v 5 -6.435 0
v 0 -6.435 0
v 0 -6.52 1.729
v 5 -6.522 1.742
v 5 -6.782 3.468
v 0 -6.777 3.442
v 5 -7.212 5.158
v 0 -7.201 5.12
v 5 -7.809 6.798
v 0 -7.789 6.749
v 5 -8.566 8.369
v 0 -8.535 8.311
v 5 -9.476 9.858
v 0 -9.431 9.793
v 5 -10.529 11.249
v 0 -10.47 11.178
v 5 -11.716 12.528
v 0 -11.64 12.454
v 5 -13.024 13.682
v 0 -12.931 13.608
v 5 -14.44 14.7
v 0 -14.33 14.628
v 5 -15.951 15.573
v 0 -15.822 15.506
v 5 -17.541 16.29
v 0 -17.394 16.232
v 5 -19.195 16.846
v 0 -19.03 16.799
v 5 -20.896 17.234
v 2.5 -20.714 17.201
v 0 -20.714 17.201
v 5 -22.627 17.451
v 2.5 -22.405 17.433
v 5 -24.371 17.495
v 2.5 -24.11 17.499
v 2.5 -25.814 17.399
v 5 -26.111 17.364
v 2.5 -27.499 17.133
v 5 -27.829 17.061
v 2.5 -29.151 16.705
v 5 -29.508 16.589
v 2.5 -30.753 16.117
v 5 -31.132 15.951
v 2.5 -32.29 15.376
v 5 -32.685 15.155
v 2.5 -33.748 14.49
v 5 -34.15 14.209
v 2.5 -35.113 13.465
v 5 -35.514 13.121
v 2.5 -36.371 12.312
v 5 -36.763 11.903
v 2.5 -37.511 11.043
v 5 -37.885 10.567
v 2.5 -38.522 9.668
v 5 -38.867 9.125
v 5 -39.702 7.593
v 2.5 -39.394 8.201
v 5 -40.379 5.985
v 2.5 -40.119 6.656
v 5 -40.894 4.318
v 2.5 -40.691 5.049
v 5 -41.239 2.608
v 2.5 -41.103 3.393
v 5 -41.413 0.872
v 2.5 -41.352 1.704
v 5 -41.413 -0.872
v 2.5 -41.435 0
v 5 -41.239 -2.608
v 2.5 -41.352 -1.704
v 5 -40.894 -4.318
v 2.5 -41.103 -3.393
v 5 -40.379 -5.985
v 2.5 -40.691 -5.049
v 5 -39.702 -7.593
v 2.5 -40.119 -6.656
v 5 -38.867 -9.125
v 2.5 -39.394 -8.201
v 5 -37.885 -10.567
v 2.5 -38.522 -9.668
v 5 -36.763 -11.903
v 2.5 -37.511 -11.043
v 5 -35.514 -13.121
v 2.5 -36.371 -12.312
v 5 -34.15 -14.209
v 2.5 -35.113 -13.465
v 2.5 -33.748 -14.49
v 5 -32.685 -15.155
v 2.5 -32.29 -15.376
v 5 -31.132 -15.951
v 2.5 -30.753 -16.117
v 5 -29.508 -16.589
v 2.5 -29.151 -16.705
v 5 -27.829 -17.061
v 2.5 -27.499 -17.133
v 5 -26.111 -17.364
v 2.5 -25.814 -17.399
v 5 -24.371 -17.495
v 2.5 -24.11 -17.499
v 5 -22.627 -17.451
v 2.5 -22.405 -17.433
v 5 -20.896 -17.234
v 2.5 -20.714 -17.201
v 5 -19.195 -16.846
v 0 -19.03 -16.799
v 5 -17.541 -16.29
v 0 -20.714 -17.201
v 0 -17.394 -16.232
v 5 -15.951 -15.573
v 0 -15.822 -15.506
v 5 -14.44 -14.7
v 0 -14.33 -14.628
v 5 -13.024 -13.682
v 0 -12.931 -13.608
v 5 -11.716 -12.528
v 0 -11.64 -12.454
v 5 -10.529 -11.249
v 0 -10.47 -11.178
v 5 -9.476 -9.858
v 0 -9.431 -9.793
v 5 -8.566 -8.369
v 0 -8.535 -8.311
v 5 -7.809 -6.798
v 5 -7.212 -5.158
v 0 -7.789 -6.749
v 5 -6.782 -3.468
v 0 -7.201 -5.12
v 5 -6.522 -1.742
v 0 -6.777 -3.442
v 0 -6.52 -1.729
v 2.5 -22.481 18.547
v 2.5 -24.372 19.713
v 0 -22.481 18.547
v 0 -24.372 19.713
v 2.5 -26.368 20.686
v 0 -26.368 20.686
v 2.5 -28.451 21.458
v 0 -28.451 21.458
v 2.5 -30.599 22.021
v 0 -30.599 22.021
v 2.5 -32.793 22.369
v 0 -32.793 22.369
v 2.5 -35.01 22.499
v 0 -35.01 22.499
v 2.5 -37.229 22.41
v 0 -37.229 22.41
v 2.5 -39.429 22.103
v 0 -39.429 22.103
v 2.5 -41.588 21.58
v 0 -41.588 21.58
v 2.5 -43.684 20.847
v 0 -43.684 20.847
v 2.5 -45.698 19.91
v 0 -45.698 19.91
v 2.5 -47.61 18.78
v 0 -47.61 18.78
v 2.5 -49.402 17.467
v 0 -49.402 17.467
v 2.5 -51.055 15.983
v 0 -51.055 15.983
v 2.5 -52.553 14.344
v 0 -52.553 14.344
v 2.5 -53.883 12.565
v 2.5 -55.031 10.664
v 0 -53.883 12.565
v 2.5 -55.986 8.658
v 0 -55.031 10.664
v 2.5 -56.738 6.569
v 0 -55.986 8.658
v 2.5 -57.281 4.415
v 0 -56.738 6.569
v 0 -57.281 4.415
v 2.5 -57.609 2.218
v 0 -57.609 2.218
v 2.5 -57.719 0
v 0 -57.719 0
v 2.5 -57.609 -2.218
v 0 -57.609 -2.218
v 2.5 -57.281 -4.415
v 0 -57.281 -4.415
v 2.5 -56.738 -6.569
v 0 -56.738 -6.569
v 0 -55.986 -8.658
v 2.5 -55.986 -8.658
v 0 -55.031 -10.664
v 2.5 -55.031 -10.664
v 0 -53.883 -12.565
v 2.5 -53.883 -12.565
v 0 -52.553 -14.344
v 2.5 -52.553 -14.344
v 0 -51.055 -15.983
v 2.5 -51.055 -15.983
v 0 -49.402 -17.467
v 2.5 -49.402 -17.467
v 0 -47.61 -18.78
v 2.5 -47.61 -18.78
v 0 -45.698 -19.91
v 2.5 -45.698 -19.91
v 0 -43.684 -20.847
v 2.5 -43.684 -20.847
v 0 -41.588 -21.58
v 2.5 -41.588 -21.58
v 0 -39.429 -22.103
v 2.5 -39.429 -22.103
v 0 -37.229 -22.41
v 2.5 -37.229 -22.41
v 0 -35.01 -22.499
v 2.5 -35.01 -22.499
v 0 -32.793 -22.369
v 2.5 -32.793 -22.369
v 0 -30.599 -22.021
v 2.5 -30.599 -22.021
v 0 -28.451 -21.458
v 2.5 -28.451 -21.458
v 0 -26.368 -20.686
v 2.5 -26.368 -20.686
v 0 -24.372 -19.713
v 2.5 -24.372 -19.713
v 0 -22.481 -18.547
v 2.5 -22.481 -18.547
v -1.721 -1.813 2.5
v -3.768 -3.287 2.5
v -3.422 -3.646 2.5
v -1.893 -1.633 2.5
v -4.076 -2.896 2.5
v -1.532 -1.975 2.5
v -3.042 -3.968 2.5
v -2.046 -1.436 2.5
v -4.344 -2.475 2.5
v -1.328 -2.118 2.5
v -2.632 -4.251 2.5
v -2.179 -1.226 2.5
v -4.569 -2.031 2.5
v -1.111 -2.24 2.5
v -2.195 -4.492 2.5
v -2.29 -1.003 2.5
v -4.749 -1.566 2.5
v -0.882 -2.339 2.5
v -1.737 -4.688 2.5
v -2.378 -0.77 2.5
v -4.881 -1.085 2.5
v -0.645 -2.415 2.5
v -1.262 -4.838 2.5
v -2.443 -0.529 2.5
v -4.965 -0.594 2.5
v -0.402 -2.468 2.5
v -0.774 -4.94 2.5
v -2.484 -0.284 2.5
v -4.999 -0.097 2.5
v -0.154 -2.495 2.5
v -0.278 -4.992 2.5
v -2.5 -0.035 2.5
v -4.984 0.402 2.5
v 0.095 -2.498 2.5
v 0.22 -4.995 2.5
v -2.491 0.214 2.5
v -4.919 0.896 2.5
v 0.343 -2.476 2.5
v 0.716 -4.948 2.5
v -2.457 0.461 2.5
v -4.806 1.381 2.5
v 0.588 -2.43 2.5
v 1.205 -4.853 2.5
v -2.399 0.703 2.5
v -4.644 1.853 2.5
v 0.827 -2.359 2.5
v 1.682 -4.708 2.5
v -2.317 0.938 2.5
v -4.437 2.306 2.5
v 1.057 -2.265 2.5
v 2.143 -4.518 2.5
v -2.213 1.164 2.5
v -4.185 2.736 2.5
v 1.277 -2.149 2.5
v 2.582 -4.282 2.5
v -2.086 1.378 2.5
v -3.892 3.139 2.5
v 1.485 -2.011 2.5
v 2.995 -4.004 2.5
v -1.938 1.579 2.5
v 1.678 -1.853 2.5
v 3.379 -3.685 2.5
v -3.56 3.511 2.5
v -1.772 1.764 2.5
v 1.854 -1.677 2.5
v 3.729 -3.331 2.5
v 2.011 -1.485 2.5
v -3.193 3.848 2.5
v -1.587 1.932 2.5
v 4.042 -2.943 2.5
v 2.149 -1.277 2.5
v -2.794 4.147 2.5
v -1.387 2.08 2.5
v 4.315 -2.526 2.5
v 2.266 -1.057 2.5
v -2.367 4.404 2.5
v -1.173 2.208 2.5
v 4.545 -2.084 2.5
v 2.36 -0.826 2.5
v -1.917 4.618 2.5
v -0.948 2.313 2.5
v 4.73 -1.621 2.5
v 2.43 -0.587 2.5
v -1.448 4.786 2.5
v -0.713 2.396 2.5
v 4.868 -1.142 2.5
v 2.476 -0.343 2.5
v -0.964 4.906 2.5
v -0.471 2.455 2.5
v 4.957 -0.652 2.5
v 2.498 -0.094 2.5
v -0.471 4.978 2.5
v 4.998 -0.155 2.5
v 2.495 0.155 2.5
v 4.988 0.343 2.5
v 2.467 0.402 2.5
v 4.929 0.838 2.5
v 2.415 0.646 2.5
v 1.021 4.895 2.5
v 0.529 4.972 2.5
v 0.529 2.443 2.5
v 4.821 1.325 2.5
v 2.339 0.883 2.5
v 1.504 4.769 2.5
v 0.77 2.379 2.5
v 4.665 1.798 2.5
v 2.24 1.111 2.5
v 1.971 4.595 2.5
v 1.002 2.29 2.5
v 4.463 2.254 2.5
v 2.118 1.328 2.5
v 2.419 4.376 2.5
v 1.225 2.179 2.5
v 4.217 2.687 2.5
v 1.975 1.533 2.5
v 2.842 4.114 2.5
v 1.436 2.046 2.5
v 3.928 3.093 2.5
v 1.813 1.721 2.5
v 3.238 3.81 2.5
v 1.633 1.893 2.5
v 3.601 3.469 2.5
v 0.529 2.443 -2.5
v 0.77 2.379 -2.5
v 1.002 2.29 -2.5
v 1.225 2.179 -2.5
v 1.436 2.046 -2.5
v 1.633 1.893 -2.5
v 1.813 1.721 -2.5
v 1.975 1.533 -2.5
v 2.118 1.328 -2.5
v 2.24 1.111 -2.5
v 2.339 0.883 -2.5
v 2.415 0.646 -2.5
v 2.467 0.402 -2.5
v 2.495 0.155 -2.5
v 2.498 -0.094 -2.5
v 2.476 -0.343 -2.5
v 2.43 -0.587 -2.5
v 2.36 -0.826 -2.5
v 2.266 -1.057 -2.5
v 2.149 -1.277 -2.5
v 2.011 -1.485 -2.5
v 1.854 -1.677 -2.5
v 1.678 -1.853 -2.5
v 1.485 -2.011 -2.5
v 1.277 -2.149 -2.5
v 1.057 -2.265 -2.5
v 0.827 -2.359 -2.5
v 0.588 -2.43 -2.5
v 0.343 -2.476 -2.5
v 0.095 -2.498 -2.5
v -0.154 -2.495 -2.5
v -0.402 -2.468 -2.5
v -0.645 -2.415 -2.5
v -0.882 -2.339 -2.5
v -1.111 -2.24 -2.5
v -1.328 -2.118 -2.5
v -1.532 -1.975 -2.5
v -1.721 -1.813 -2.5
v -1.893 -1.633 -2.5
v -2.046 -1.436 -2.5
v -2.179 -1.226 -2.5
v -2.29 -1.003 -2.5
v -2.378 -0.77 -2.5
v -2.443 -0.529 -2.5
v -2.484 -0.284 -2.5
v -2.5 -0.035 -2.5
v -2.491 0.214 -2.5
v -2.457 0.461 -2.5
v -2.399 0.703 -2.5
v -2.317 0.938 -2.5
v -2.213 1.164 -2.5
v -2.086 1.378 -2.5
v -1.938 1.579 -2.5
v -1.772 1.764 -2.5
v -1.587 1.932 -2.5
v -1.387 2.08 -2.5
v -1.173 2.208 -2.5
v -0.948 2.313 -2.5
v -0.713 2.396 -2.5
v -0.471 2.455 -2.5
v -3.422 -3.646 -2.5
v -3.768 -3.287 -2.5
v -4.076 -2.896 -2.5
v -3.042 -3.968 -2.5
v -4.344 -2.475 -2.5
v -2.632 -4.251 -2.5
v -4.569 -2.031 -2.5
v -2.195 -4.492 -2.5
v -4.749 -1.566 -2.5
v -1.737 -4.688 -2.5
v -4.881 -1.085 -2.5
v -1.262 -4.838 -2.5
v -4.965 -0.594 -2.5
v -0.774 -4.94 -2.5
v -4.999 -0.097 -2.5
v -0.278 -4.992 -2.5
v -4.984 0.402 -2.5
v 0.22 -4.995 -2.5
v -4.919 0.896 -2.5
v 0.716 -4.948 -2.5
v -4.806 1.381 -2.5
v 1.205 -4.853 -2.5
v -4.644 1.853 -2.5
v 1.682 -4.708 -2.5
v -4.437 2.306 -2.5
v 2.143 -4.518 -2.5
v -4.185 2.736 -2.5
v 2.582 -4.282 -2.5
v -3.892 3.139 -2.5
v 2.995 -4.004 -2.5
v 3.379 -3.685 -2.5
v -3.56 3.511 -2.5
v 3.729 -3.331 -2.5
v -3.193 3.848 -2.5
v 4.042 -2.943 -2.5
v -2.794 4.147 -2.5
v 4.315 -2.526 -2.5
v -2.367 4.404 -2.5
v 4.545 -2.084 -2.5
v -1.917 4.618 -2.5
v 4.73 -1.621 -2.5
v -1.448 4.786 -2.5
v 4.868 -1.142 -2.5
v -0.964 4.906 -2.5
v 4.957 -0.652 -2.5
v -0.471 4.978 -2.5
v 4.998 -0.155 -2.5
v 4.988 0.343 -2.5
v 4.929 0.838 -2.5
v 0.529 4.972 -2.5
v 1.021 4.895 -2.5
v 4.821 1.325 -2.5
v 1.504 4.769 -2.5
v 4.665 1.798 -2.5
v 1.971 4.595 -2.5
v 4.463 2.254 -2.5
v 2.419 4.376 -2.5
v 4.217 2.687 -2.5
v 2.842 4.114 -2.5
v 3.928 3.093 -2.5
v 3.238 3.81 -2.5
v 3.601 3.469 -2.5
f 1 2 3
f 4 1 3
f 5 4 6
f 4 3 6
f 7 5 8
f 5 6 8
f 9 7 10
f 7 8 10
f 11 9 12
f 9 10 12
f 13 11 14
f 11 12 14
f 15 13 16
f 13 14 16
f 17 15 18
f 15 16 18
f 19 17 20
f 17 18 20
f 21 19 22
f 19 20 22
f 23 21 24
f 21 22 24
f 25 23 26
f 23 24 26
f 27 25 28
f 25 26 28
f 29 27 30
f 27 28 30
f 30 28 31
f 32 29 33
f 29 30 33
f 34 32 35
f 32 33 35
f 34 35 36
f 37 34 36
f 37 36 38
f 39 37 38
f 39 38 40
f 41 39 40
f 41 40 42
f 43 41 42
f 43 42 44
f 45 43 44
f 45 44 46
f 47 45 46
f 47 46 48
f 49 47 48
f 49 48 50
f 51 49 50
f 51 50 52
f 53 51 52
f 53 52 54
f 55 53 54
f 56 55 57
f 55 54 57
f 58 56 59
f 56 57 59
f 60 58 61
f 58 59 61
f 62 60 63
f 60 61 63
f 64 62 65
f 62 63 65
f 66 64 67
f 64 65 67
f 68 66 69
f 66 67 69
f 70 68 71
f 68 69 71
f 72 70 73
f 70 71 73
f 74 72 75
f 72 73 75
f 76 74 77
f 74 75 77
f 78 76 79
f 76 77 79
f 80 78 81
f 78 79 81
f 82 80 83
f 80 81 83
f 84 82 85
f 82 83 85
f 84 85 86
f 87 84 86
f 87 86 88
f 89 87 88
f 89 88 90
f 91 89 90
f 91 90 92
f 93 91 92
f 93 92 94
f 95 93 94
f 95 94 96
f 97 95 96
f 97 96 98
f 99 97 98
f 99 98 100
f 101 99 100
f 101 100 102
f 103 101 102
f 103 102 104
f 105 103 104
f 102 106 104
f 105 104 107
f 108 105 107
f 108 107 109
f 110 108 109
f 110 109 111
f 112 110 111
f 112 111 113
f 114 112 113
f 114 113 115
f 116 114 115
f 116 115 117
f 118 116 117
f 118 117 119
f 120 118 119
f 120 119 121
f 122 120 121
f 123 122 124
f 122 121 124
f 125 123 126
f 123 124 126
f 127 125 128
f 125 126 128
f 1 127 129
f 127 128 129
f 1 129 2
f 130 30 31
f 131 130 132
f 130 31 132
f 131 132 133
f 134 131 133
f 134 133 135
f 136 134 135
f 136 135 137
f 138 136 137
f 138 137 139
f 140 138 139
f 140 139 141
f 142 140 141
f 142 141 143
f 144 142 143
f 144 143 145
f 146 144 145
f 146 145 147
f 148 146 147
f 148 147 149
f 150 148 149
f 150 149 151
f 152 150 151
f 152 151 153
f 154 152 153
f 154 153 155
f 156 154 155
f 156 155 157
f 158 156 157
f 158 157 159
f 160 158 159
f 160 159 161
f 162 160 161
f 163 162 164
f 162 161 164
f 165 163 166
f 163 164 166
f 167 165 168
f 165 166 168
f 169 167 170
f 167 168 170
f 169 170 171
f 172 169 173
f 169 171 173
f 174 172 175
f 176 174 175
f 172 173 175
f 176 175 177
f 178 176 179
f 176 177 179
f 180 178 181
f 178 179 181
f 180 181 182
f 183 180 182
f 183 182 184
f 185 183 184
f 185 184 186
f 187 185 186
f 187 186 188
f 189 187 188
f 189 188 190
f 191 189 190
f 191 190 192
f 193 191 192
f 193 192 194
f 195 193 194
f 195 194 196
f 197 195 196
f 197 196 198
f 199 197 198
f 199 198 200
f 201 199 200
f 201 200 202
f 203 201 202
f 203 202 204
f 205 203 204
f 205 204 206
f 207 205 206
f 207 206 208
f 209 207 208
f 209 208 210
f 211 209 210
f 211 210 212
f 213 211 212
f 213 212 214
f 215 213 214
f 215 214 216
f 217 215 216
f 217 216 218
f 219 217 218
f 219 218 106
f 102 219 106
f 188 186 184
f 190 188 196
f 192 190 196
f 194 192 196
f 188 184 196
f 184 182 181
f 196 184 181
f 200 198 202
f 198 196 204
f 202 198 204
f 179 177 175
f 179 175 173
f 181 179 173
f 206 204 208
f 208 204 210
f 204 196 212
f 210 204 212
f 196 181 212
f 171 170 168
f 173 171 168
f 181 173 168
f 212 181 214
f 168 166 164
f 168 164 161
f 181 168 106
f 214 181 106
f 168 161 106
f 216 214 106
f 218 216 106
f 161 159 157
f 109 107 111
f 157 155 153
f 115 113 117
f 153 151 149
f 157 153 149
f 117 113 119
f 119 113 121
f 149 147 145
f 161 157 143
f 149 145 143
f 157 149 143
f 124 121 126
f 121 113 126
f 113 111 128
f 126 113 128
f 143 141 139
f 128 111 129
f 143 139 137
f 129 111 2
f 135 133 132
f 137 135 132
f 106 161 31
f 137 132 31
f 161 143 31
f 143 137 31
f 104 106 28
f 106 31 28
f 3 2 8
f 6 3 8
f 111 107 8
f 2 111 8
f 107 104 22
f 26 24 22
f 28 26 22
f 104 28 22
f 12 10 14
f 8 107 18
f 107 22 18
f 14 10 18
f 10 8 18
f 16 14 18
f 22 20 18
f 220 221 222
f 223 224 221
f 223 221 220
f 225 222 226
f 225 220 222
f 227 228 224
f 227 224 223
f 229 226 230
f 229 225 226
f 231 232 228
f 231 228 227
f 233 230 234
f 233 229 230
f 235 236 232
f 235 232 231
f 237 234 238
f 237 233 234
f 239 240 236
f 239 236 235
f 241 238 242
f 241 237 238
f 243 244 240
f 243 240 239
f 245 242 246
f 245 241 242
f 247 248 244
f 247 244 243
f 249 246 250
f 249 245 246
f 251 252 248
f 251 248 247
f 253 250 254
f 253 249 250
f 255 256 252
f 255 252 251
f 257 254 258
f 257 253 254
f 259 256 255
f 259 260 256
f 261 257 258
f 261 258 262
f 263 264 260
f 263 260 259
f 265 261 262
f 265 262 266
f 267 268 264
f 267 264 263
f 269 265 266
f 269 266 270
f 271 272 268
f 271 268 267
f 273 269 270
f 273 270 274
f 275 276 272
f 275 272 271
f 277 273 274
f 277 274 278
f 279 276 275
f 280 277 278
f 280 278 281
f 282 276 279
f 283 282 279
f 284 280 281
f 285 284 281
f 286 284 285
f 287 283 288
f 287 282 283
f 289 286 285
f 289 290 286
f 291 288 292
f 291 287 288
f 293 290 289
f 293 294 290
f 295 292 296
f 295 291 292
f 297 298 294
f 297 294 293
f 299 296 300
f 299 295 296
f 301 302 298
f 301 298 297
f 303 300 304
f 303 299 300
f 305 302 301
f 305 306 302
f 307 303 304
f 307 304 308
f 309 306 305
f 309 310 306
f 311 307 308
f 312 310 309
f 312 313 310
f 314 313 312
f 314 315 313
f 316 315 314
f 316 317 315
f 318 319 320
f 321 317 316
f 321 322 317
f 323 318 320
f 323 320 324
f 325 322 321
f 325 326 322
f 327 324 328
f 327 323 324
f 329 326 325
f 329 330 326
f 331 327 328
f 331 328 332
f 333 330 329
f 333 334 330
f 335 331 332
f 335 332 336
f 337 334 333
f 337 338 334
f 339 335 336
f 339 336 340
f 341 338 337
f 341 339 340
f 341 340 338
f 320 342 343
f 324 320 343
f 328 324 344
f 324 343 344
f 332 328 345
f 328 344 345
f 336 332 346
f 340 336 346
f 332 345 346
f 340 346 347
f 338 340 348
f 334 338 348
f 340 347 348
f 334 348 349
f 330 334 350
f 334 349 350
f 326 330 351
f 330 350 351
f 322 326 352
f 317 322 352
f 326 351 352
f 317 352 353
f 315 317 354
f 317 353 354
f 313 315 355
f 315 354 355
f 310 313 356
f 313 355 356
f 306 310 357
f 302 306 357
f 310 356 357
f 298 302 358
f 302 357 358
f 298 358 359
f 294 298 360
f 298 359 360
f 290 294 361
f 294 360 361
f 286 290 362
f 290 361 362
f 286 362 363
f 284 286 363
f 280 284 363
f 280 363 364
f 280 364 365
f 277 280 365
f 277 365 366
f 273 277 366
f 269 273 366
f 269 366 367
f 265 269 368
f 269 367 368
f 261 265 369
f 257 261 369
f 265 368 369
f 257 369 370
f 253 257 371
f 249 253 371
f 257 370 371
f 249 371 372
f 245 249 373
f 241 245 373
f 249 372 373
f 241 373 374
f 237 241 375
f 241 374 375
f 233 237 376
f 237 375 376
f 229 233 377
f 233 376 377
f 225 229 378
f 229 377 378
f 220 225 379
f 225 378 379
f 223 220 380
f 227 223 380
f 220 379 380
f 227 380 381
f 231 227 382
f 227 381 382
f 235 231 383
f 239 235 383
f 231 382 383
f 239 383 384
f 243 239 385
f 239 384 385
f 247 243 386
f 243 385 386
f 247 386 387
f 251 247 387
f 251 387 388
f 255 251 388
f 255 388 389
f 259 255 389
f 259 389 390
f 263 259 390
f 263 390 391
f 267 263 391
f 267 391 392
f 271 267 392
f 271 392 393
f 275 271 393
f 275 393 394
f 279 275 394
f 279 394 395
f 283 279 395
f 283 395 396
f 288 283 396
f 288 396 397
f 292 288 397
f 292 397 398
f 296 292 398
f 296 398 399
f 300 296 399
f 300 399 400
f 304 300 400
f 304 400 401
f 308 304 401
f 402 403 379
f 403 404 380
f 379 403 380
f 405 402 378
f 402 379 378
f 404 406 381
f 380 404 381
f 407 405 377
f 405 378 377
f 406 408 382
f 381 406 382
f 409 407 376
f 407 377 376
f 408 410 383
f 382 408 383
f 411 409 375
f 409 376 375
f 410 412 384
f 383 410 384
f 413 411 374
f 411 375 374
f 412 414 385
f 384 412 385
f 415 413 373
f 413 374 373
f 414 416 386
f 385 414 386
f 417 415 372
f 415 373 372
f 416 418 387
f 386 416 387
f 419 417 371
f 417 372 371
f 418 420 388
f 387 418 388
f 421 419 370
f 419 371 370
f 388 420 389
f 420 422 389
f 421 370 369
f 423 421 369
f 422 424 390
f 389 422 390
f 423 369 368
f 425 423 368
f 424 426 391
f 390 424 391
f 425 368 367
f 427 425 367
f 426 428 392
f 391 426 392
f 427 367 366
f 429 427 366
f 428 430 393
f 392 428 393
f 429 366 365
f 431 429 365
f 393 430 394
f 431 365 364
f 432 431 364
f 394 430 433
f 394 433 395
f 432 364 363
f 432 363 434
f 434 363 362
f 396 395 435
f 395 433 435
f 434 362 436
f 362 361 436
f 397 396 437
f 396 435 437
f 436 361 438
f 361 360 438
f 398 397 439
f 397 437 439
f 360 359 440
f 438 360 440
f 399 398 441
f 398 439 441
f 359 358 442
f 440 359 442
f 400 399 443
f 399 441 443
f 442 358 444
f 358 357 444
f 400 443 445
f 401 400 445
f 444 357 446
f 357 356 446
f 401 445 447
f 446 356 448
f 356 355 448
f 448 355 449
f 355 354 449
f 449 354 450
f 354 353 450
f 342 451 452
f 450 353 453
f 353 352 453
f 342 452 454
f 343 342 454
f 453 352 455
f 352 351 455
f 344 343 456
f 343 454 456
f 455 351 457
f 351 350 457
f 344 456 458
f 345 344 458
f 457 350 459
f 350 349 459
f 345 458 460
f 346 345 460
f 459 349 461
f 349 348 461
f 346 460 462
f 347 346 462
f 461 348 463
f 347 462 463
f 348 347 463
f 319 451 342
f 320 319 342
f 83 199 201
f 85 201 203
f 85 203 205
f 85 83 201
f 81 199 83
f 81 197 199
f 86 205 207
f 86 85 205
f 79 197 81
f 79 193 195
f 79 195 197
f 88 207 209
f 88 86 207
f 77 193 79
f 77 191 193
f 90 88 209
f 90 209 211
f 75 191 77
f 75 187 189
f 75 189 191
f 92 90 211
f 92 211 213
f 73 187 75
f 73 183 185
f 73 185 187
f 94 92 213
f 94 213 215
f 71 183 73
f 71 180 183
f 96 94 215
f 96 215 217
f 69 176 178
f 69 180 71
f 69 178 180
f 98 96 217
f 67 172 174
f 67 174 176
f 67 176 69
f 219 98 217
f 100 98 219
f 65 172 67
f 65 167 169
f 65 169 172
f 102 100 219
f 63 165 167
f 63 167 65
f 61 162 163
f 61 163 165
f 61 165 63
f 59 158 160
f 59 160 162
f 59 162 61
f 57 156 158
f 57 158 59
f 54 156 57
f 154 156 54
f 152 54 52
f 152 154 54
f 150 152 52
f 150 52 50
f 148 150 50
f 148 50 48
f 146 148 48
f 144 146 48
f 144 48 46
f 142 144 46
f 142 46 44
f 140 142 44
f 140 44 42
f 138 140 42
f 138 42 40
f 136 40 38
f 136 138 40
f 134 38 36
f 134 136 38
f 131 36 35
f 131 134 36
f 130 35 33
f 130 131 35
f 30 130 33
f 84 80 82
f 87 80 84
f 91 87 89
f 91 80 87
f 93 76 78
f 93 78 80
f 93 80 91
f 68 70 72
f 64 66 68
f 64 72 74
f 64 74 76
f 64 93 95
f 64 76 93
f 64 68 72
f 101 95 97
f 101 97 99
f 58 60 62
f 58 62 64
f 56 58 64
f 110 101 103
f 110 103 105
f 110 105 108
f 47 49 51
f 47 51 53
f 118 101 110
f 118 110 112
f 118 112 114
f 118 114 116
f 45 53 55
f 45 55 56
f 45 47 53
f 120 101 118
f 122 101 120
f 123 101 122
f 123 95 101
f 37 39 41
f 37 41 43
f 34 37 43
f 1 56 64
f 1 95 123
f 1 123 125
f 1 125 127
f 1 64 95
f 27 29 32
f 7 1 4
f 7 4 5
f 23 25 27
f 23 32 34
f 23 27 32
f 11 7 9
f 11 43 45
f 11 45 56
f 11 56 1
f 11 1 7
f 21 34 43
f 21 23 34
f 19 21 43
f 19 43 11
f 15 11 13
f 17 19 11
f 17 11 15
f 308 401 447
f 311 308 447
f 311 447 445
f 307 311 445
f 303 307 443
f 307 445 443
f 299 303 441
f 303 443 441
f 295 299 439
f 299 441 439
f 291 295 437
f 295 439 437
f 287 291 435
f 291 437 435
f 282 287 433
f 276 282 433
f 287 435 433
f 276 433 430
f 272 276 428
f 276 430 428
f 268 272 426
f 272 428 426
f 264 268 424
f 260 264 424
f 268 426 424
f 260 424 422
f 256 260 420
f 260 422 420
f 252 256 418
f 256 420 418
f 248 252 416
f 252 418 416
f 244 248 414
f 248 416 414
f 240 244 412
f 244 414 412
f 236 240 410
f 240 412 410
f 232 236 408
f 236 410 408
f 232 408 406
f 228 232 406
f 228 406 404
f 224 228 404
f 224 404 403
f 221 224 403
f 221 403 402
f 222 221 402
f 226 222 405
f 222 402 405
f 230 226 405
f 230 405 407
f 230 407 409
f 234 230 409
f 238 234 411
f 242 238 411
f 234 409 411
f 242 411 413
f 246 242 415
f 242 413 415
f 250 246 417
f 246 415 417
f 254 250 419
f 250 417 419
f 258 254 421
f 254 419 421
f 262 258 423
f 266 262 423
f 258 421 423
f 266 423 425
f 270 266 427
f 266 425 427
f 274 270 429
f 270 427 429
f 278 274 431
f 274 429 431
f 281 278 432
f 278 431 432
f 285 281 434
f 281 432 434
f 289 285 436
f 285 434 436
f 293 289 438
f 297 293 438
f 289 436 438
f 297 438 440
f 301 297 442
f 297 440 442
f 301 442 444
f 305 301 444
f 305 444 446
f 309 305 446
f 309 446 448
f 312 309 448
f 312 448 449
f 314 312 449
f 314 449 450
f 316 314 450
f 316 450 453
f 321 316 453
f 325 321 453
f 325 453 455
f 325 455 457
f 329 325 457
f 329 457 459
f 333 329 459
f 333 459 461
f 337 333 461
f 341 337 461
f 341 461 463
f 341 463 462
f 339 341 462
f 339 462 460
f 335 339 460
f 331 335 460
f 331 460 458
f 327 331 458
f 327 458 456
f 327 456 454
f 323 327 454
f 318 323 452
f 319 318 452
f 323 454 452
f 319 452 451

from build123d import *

# Parameters (mm, degrees)
F1_DEPTH = 5
F3_R     = 17.5
F5_DEPTH = 5
F4_R     = 22.5
F6_DEPTH = 2.5


with BuildPart() as f1:
    # F0 (on Top) → F1 (new body)
    with BuildSketch(Plane.XY):
        with BuildLine():
            Line((-0.470956, 2.455239), (-0.470956, 4.977771))
            ThreePointArc((-0.470956, 4.977771), (-0.02919, -4.999915), (0.529044, 4.971932))
            Line((0.529044, 4.971932), (0.529044, 2.443381))
            ThreePointArc((0.529044, 2.443381), (-0.029643, -2.499824), (-0.470956, 2.455239))
        make_face()
    extrude(amount=F1_DEPTH)


with BuildPart() as f1_1:
    # F2: moved
    add(f1.part.moved(Location((0, 0, -2.5))))


with BuildPart() as f5:
    # F3 (on Right) → F5 (new body)
    with BuildSketch(Plane.YZ):
        with Locations((-23.934805, 0)):
            Circle(F3_R)
    extrude(amount=F5_DEPTH)

    # F4 (on Right) → F6 (join)
    with BuildSketch(Plane.YZ):
        with Locations((-35.218501, 0)):
            Circle(F4_R)
    extrude(amount=F6_DEPTH)


solid = Compound([f1_1.part, f5.part])
